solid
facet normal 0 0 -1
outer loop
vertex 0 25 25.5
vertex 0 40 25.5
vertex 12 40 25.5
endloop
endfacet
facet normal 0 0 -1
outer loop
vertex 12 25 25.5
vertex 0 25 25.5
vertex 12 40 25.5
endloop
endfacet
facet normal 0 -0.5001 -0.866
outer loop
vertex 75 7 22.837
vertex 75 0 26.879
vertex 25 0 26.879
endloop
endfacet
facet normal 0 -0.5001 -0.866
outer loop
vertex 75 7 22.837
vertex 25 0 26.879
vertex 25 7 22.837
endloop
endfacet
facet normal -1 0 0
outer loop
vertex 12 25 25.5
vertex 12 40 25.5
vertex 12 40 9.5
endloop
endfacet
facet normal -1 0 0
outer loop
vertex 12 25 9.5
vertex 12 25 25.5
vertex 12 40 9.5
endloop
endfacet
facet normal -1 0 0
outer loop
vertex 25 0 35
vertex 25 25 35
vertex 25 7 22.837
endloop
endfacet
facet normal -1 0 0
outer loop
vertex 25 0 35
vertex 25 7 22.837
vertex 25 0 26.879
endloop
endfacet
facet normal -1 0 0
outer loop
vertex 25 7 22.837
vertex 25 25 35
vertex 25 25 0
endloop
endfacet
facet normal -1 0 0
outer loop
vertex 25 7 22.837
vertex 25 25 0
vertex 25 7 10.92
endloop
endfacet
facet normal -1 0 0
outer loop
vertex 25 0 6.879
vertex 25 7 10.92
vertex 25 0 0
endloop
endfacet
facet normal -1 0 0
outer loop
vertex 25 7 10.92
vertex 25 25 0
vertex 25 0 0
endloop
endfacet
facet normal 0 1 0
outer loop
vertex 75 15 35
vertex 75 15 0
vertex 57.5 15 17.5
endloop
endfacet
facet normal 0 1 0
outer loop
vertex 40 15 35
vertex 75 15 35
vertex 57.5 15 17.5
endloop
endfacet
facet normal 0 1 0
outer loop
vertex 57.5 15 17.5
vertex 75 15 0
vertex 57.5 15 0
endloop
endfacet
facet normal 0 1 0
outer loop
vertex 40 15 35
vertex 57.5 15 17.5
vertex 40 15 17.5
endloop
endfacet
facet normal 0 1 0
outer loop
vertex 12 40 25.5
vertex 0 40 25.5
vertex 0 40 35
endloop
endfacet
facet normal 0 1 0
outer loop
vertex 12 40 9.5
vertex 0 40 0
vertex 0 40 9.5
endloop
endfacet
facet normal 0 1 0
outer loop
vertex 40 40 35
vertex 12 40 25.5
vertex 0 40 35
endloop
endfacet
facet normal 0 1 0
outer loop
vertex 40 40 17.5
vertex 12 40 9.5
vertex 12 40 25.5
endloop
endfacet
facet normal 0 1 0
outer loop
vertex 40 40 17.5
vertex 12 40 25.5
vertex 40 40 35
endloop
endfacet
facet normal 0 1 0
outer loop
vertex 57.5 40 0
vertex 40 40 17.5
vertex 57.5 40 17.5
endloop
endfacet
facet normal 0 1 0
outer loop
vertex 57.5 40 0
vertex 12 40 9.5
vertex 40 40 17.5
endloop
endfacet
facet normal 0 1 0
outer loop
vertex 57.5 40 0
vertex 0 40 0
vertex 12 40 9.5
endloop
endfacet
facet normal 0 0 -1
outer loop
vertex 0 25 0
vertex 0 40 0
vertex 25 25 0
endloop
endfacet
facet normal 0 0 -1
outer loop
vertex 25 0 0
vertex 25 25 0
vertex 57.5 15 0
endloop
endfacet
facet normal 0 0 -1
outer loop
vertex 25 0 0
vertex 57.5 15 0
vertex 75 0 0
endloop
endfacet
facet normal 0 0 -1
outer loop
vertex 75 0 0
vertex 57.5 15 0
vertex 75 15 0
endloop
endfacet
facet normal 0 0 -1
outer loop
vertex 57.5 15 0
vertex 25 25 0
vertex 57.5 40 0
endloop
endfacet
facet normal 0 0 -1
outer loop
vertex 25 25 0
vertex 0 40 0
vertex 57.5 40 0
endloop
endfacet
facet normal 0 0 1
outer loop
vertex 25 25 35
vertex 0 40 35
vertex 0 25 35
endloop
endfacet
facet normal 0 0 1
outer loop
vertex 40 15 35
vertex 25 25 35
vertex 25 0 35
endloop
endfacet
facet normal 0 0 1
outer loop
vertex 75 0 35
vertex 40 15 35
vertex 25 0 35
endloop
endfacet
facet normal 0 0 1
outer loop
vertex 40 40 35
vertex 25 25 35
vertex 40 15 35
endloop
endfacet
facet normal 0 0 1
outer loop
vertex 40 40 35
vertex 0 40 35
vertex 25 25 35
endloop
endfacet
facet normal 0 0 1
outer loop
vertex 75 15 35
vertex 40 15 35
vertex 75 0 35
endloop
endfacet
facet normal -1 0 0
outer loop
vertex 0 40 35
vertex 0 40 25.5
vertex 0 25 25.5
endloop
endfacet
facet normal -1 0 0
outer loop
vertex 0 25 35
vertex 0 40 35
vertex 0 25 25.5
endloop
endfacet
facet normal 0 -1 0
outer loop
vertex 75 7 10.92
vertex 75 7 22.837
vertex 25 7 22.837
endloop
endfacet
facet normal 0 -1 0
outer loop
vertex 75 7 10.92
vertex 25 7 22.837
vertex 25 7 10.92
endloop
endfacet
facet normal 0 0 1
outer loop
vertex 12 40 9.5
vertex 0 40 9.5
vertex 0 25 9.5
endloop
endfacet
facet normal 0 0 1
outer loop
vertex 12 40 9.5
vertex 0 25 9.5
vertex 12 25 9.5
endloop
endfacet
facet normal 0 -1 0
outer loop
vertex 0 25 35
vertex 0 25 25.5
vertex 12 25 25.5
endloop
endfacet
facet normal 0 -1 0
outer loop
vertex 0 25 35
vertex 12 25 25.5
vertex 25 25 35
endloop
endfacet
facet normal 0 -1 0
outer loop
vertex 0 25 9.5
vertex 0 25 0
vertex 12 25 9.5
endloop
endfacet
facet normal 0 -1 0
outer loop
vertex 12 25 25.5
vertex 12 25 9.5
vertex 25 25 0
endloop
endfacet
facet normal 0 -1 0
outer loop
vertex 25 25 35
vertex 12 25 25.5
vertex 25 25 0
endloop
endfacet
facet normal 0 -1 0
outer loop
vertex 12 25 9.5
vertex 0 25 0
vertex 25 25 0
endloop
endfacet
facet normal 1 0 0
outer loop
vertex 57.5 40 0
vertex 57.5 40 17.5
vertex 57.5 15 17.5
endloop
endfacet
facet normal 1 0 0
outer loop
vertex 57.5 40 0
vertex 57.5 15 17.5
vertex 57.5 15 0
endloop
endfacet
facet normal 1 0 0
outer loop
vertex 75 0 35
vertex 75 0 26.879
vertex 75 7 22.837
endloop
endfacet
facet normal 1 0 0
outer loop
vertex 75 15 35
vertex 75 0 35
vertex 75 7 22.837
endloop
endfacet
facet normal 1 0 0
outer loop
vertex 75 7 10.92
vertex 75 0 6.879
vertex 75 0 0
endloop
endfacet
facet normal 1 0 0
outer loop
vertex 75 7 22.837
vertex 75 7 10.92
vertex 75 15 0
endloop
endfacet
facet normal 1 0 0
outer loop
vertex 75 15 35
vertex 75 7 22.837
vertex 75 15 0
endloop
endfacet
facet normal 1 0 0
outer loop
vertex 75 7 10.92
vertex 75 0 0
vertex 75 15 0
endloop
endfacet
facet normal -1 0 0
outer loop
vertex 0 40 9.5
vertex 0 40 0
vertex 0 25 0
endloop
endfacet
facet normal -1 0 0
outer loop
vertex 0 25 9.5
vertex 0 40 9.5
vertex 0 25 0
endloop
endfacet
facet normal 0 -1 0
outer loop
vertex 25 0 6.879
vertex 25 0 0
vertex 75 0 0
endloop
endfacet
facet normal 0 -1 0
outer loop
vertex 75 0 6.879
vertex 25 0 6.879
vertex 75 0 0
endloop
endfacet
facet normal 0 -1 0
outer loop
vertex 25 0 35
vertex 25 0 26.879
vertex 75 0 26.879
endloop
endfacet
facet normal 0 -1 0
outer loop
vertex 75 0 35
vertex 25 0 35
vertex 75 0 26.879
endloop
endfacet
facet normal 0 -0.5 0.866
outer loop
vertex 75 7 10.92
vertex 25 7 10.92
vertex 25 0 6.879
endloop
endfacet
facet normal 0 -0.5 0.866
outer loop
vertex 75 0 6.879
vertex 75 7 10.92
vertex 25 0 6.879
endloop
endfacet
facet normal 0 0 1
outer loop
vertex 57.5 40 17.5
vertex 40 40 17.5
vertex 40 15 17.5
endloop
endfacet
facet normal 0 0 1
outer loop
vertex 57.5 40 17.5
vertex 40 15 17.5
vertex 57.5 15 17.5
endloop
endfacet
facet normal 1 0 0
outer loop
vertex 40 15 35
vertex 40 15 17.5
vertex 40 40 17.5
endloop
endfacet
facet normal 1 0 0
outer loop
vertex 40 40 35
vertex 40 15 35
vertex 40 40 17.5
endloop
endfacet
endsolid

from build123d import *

# Parameters (mm, degrees)
BOSS_EXTRUDE1_DEPTH = 35
SKETCH3_W           = 12
SKETCH3_H           = 16
CUT_EXTRUDE1_DEPTH  = 35
BOSS_EXTRUDE2_REACH = 93.924
SKETCH4_W           = 17.5
SKETCH4_H           = 17.5
CUT_EXTRUDE2_DEPTH  = 92.923881554


with BuildPart() as part:
    # Sketch2 → Boss-Extrude1 (new body)
    with BuildSketch(Plane.XY):
        Polygon((25, 25), (25, 0), (75, 0), (75, 15), (40, 15), (40, 40), (0, 40), (0, 25), align=None)
    extrude(amount=BOSS_EXTRUDE1_DEPTH)

    # Sketch3 → Cut-Extrude1 (cut)
    with BuildSketch(Plane(origin=(0, 40, 0), x_dir=(1, 0, 0), z_dir=(0, 1, 0))):
        with Locations((6, -17.5)):
            Rectangle(SKETCH3_W, SKETCH3_H)
    extrude(amount=-CUT_EXTRUDE1_DEPTH, mode=Mode.SUBTRACT)

    # Sketch4 → Boss-Extrude2 (add, up to next)
    with BuildSketch(Plane(origin=(0, 40, 0), x_dir=(1, 0, 0), z_dir=(0, 1, 0)), mode=Mode.PRIVATE) as boss_extrude2_sk1:
        with Locations((48.75, -8.75)):
            Rectangle(SKETCH4_W, SKETCH4_H)
    boss_extrude2_tool1 = extrude(boss_extrude2_sk1.sketch, amount=-BOSS_EXTRUDE2_REACH, mode=Mode.PRIVATE) - part.part
    add(boss_extrude2_tool1.solids().sort_by_distance((48.75, 40, 8.75))[0])

    # Sketch5 → Cut-Extrude2 (cut, through all)
    with BuildSketch(Plane(origin=(75, 0, 0), x_dir=(0, 0, -1), z_dir=(1, 0, 0))):
        Polygon((-26.878944817, 0), (-22.837492933, 7), (-10.920396702, 7), (-6.878944817, 0), align=None)
    extrude(amount=-CUT_EXTRUDE2_DEPTH, mode=Mode.SUBTRACT)


solid = part.part
